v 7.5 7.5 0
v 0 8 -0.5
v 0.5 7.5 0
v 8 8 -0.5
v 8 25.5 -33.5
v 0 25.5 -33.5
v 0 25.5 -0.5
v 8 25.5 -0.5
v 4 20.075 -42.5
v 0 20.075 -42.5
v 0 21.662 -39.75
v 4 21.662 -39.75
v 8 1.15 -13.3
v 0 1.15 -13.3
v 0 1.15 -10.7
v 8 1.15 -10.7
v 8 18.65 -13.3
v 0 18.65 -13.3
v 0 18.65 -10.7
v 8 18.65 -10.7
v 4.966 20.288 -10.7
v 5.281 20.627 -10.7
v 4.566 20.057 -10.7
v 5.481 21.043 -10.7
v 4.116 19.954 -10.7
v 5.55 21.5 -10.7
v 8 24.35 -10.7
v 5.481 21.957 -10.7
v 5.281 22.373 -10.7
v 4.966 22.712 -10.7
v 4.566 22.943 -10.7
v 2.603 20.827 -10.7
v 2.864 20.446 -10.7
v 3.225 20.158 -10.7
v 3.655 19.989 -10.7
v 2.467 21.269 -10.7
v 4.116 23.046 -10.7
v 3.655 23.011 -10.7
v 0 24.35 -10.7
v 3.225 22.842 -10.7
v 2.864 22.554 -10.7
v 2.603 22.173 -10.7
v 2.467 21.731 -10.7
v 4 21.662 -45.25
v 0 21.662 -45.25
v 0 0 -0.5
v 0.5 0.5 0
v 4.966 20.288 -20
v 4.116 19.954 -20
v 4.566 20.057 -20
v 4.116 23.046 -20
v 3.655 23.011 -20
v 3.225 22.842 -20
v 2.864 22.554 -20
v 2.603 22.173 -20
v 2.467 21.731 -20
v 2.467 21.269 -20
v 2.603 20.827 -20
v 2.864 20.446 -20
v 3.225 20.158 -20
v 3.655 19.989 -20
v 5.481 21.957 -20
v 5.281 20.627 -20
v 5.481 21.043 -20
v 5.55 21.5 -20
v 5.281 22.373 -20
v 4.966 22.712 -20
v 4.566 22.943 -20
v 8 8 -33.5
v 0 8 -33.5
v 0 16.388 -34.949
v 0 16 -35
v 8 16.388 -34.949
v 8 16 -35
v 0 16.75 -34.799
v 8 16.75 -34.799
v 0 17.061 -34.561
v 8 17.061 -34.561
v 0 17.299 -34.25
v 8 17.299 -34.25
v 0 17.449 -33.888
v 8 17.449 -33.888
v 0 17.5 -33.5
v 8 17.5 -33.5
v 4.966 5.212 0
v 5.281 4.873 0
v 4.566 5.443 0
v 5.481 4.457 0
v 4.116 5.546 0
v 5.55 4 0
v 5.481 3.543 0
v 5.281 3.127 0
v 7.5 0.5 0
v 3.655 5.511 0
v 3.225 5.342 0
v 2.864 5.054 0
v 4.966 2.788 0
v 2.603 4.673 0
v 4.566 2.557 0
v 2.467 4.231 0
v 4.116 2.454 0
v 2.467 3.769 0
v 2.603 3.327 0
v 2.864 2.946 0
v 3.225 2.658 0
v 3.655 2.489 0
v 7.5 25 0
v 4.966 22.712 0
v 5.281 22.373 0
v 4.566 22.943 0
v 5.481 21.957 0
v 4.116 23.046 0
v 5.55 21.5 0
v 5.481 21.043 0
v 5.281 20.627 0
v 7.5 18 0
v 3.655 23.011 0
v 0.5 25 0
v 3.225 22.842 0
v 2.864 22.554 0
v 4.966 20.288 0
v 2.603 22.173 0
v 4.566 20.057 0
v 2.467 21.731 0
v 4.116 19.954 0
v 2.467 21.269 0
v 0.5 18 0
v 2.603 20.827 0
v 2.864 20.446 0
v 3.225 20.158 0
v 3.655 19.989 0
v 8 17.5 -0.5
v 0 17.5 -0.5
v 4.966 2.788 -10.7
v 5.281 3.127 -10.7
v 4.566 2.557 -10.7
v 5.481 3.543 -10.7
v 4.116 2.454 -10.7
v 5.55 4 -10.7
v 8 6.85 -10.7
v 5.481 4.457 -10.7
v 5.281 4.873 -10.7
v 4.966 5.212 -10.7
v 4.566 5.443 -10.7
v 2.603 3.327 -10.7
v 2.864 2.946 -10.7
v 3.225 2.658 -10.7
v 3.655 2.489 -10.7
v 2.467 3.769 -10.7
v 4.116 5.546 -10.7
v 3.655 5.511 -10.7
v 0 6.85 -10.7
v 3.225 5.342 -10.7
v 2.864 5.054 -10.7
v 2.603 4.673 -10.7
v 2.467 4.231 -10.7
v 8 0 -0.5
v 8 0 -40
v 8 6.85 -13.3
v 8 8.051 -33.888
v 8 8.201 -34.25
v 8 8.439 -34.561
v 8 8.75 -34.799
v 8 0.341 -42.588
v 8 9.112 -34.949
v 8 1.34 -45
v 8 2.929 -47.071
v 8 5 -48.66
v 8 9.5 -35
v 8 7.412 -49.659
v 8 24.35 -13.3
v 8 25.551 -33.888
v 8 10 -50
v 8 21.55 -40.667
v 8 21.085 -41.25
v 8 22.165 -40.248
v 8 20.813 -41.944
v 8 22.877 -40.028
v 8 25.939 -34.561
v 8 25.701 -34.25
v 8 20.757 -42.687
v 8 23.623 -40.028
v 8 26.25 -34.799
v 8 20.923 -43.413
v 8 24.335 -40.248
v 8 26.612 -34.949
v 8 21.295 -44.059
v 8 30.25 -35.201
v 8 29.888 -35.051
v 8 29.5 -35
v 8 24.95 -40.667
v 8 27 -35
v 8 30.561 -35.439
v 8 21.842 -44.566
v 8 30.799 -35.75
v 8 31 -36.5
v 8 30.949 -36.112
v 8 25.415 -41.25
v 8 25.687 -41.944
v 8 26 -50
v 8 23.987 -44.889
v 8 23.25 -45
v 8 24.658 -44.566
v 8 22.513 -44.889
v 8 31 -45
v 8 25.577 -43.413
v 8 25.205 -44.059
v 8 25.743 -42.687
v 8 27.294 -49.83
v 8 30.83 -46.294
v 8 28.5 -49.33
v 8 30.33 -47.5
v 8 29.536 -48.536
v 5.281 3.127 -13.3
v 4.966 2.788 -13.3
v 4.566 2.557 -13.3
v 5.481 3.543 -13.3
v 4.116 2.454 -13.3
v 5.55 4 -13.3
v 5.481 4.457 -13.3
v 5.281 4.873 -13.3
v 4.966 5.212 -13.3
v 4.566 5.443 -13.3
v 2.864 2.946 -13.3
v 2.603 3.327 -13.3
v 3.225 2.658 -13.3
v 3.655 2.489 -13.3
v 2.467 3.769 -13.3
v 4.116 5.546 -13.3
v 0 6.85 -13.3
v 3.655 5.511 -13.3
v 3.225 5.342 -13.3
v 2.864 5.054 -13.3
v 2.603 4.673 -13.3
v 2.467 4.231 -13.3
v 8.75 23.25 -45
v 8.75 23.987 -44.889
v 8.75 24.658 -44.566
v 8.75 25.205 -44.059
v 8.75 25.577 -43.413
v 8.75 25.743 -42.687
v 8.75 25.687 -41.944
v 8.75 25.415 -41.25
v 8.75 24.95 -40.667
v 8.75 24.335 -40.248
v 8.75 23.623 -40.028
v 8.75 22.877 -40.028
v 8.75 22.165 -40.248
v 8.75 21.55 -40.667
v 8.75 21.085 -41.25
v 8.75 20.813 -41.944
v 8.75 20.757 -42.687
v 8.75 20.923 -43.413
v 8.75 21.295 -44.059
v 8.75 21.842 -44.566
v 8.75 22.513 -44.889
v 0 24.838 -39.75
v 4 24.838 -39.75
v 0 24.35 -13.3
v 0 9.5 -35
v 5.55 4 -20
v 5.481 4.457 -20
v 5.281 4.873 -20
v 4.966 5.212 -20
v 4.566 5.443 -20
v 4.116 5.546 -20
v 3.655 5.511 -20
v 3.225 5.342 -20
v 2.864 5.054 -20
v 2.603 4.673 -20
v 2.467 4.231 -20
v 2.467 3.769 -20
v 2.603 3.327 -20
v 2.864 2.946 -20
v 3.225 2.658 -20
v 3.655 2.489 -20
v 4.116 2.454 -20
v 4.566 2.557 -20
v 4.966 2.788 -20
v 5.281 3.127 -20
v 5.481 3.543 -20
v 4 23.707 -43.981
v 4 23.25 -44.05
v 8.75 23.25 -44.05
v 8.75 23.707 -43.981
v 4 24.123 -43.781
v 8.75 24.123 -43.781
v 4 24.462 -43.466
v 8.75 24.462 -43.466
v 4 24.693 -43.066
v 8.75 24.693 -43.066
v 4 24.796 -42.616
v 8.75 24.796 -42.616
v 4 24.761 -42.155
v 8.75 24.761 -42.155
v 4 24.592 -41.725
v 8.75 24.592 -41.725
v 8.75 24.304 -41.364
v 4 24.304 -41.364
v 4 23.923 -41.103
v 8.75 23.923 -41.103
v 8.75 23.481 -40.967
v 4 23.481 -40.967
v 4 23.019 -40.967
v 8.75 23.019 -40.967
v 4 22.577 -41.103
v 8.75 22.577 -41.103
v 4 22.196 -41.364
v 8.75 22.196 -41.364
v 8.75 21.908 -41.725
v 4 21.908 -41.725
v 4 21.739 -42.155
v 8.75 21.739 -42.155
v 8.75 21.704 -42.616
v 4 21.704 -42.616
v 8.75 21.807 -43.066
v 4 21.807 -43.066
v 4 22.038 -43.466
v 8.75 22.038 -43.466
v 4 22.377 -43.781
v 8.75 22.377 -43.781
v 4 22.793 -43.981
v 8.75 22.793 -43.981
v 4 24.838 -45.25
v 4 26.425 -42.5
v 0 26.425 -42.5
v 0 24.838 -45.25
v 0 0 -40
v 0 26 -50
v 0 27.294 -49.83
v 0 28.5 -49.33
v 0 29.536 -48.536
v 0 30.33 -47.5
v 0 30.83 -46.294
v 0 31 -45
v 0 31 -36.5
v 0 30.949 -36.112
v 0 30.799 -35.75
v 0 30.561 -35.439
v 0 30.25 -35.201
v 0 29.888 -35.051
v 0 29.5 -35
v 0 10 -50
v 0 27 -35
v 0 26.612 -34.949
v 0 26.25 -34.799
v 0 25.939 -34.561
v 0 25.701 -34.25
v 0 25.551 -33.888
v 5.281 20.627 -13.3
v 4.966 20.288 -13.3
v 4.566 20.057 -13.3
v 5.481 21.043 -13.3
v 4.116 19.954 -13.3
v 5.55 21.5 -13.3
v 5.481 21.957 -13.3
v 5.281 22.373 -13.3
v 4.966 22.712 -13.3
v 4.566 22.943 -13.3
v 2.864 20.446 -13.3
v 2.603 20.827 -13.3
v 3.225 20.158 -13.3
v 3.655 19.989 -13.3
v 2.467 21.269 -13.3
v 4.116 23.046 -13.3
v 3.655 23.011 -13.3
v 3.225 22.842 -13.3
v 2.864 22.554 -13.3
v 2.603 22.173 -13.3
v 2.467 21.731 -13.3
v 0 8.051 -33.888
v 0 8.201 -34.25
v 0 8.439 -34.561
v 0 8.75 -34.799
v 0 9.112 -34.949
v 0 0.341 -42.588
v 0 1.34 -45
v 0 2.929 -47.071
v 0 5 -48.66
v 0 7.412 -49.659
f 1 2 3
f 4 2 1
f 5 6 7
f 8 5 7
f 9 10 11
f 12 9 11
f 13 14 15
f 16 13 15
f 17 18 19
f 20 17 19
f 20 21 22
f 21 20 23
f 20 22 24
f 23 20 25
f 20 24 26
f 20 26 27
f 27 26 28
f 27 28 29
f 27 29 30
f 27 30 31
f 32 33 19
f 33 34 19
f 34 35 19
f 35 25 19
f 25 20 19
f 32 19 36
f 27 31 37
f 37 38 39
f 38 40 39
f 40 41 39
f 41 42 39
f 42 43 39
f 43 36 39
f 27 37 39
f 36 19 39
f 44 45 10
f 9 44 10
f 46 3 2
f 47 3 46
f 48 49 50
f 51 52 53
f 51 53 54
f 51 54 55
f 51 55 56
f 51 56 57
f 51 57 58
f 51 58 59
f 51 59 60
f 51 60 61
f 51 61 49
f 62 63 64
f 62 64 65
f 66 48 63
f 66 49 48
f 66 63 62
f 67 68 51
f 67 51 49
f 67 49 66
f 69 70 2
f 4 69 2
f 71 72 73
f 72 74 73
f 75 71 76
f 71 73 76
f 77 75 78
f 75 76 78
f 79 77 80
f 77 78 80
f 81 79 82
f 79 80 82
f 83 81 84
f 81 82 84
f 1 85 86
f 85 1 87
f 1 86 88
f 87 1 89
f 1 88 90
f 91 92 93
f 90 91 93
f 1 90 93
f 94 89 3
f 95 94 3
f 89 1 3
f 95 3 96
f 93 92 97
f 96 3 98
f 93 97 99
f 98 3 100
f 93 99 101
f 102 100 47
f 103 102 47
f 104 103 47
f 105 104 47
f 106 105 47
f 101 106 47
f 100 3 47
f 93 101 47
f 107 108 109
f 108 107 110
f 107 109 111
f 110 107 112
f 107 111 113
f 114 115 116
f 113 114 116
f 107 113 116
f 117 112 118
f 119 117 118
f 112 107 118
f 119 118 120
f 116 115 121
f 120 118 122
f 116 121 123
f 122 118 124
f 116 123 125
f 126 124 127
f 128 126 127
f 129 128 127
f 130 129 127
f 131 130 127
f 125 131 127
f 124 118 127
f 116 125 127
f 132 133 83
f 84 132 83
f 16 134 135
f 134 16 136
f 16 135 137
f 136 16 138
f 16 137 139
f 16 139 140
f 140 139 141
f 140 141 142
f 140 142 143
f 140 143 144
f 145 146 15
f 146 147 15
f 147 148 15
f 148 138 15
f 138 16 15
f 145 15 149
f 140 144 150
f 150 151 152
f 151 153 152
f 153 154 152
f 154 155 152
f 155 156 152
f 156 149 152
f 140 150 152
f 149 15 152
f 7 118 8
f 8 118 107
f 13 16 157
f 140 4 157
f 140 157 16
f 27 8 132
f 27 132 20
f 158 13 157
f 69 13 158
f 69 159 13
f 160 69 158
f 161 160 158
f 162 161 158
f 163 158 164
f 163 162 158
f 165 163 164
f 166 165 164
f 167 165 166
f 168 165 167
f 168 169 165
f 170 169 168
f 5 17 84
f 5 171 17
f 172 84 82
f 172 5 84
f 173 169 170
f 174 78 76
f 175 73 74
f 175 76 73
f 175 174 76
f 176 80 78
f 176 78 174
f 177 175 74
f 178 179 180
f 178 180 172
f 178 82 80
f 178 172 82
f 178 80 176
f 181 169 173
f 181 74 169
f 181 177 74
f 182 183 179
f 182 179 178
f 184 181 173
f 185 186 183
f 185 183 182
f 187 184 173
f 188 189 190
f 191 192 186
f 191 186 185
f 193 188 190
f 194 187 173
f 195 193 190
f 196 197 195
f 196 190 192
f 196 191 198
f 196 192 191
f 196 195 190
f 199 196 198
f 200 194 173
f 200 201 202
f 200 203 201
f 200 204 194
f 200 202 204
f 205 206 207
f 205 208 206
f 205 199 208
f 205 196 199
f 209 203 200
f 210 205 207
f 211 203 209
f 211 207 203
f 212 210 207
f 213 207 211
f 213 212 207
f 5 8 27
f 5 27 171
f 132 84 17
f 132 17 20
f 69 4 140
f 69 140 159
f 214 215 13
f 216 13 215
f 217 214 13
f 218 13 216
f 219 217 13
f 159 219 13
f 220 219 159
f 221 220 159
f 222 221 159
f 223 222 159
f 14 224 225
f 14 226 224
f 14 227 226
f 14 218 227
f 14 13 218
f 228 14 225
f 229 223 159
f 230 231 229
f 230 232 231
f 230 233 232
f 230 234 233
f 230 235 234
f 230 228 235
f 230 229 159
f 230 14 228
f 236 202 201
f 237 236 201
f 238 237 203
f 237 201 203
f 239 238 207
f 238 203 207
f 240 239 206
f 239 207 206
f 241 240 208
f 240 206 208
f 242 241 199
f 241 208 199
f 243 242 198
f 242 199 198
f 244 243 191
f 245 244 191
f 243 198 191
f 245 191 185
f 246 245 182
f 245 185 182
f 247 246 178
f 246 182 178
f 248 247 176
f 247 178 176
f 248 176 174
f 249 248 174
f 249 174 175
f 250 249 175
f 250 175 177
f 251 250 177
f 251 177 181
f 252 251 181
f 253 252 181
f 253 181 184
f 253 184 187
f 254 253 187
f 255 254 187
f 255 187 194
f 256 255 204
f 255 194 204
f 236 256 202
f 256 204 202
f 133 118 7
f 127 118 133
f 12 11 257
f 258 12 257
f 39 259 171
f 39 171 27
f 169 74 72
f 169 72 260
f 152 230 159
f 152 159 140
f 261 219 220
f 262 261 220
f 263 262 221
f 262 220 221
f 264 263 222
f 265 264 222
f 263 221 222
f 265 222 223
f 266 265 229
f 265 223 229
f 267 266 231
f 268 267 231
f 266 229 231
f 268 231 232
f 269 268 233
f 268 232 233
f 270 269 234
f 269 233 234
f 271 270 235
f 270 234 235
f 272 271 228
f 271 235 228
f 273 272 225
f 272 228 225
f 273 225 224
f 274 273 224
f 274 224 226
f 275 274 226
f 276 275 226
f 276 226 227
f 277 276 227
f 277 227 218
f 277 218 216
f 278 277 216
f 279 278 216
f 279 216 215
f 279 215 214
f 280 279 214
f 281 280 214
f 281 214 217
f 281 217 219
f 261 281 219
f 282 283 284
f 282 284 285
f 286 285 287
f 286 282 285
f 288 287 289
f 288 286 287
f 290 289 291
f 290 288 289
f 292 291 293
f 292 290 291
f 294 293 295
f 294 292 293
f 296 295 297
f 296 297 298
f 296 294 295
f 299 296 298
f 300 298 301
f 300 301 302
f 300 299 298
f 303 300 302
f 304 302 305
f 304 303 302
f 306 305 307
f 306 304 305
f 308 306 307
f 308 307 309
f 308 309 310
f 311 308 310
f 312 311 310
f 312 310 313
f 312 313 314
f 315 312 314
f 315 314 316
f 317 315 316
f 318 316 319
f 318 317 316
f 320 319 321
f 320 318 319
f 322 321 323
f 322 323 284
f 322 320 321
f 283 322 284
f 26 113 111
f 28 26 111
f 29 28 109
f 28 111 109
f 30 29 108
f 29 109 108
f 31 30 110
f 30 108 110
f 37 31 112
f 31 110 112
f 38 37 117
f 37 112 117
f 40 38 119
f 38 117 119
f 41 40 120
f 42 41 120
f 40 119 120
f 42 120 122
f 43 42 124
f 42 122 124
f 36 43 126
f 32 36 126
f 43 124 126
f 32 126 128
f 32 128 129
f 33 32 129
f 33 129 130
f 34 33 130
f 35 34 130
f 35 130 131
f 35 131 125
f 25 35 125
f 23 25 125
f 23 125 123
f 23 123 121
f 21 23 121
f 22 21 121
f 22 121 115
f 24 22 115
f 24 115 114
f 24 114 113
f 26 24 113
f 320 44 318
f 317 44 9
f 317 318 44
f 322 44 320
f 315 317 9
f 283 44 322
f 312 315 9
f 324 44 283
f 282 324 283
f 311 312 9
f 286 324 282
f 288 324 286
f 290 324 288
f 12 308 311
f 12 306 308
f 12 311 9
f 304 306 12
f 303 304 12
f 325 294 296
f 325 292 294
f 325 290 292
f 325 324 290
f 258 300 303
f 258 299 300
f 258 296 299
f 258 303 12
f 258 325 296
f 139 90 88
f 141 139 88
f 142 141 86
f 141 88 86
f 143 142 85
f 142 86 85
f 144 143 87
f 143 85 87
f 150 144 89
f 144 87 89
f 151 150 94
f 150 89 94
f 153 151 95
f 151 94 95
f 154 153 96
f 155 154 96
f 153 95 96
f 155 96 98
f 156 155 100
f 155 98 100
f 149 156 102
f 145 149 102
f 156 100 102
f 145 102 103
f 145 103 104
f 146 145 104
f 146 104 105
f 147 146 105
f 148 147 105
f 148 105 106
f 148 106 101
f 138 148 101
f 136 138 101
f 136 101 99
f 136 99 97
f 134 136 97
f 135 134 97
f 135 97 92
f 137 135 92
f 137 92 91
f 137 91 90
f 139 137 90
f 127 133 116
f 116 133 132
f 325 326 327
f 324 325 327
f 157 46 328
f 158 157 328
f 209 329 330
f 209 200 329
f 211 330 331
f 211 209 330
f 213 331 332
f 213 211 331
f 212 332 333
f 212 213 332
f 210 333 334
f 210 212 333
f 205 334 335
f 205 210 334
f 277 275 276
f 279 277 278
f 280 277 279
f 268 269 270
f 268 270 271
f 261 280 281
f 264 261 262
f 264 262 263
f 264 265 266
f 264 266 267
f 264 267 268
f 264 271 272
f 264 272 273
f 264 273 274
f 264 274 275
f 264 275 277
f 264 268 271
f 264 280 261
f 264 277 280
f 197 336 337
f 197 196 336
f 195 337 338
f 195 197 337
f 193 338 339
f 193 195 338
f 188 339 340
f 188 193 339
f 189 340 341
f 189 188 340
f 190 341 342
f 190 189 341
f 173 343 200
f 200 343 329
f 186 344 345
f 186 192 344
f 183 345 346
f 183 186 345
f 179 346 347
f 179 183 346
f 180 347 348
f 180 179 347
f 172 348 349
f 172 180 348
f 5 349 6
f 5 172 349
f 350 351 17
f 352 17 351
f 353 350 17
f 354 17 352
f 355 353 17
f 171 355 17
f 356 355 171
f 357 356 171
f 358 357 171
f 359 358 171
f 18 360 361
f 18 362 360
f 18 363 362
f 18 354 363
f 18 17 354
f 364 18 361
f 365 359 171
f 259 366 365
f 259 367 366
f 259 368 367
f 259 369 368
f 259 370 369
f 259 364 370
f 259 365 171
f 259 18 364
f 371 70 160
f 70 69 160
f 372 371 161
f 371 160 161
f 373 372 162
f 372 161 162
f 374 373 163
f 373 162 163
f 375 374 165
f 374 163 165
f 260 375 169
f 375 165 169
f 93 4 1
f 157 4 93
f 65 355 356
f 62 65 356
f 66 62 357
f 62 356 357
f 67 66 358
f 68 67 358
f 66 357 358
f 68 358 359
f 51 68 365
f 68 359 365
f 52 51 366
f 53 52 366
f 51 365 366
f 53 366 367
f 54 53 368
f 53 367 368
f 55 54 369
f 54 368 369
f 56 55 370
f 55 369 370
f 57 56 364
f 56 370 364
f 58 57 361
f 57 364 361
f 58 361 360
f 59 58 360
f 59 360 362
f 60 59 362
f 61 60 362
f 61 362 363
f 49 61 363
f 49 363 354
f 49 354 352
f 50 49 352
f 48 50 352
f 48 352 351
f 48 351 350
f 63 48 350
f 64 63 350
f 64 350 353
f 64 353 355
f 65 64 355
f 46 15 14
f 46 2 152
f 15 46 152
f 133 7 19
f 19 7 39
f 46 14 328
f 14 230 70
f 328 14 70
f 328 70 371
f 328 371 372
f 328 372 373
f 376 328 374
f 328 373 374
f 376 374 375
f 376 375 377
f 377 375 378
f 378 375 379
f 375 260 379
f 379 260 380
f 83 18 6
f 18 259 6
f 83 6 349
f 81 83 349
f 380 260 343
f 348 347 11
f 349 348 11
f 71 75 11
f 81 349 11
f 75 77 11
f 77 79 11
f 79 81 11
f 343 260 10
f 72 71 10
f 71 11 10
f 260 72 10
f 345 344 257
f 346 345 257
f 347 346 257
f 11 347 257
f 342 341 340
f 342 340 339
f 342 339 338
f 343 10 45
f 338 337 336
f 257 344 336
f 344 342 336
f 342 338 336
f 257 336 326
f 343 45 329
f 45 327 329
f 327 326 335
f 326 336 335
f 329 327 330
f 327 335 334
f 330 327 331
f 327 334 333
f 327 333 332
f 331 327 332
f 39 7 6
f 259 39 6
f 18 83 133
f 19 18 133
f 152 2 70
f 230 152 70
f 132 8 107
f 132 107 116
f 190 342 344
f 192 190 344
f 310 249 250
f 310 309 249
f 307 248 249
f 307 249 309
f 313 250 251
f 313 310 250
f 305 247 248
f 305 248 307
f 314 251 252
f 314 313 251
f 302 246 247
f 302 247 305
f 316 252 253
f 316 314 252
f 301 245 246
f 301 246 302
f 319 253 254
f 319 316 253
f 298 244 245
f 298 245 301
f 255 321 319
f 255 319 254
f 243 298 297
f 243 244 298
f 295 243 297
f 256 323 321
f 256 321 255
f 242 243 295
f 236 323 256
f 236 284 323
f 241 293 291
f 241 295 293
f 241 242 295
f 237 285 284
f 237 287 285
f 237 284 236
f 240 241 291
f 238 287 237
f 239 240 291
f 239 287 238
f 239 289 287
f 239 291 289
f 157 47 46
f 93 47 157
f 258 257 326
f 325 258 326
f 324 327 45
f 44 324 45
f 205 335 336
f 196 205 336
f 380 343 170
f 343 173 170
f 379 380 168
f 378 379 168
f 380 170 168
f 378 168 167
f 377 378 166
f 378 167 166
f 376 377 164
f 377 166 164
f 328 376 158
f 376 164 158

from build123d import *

# Parameters (mm, degrees)
SKETCH1_R           = 1.55
BOSS_EXTRUDE1_DEPTH = 8
SKETCH4_R           = 1.55
CUT_EXTRUDE2_DEPTH  = 20
SKETCH5_W           = 2.6
SKETCH5_H           = 5.7
CUT_EXTRUDE3_DEPTH  = 60.371710435
FILLET2_R           = 1.5
FILLET3_R           = 5
FILLET4_R           = 10
CHAMFER1_SIZE       = 0.5
SKETCH6_R           = 2.5
SKETCH6_R_2         = 1.55
BOSS_EXTRUDE3_DEPTH = 0.75
CUT_EXTRUDE4_DEPTH  = 4


with BuildPart() as part:
    # Sketch1 → Boss-Extrude1 (new body)
    with BuildSketch(Plane(origin=(0, 0, 0), x_dir=(0, 0, -1), z_dir=(1, 0, 0))):
        Polygon((0, 0), (50, 0), (50, 31), (35, 31), (35, 25.5), (0, 25.5), (0, 17.5), (35, 17.5), (35, 8), (0, 8), align=None)
        with Locations((42.5, 23.25)):
            Circle(SKETCH1_R, mode=Mode.SUBTRACT)
    extrude(amount=BOSS_EXTRUDE1_DEPTH)

    # Sketch4 → Cut-Extrude2 (cut)
    with BuildSketch(Plane.XY):
        with Locations((4, 21.5)):
            Circle(SKETCH4_R)
        with Locations((4, 4)):
            Circle(SKETCH4_R)
    extrude(amount=-CUT_EXTRUDE2_DEPTH, mode=Mode.SUBTRACT)

    # Sketch5 → Cut-Extrude3 (cut, through all)
    with BuildSketch(Plane.ZY):
        with Locations((-12, 21.5)):
            Rectangle(SKETCH5_W, SKETCH5_H)
        with Locations((-12, 4)):
            Rectangle(SKETCH5_W, SKETCH5_H)
    extrude(amount=-CUT_EXTRUDE3_DEPTH, mode=Mode.SUBTRACT)

    # Fillet2
    fillet2_edges = [part.edges().sort_by_distance(p)[0] for p in [
        (4, 8, -35),
        (4, 17.5, -35),
        (4, 25.5, -35),
        (4, 31, -35),
    ]]
    fillet(fillet2_edges, radius=FILLET2_R)

    # Fillet3
    fillet3_edges = [part.edges().sort_by_distance(p)[0] for p in [
        (4, 31, -50),
    ]]
    fillet(fillet3_edges, radius=FILLET3_R)

    # Fillet4
    fillet4_edges = [part.edges().sort_by_distance(p)[0] for p in [
        (4, 0, -50),
    ]]
    fillet(fillet4_edges, radius=FILLET4_R)

    # Chamfer1
    chamfer1_edges = [part.edges().sort_by_distance(p)[0] for p in [
        (0, 21.5, 0),
        (0, 4, 0),
        (4, 8, 0),
        (4, 17.5, 0),
        (4, 25.5, 0),
        (4, 0, 0),
        (8, 21.5, 0),
        (8, 4, 0),
    ]]
    chamfer(chamfer1_edges, length=CHAMFER1_SIZE)

    # Sketch6 → Boss-Extrude3 (add)
    with BuildSketch(Plane(origin=(8, 0, 0), x_dir=(0, 0, -1), z_dir=(1, 0, 0))):
        with Locations((42.5, 23.25)):
            Circle(SKETCH6_R)
        with Locations((42.5, 23.25)):
            Circle(SKETCH6_R_2, mode=Mode.SUBTRACT)
    extrude(amount=BOSS_EXTRUDE3_DEPTH)

    # Sketch7 → Cut-Extrude4 (cut)
    with BuildSketch(Plane.ZY):
        Polygon((-39.750369343, 24.8375), (-42.5, 26.425), (-45.249630657, 24.8375), (-45.249630657, 21.6625), (-42.5, 20.075), (-39.750369343, 21.6625), align=None)
    extrude(amount=-CUT_EXTRUDE4_DEPTH, mode=Mode.SUBTRACT)


solid = part.part
